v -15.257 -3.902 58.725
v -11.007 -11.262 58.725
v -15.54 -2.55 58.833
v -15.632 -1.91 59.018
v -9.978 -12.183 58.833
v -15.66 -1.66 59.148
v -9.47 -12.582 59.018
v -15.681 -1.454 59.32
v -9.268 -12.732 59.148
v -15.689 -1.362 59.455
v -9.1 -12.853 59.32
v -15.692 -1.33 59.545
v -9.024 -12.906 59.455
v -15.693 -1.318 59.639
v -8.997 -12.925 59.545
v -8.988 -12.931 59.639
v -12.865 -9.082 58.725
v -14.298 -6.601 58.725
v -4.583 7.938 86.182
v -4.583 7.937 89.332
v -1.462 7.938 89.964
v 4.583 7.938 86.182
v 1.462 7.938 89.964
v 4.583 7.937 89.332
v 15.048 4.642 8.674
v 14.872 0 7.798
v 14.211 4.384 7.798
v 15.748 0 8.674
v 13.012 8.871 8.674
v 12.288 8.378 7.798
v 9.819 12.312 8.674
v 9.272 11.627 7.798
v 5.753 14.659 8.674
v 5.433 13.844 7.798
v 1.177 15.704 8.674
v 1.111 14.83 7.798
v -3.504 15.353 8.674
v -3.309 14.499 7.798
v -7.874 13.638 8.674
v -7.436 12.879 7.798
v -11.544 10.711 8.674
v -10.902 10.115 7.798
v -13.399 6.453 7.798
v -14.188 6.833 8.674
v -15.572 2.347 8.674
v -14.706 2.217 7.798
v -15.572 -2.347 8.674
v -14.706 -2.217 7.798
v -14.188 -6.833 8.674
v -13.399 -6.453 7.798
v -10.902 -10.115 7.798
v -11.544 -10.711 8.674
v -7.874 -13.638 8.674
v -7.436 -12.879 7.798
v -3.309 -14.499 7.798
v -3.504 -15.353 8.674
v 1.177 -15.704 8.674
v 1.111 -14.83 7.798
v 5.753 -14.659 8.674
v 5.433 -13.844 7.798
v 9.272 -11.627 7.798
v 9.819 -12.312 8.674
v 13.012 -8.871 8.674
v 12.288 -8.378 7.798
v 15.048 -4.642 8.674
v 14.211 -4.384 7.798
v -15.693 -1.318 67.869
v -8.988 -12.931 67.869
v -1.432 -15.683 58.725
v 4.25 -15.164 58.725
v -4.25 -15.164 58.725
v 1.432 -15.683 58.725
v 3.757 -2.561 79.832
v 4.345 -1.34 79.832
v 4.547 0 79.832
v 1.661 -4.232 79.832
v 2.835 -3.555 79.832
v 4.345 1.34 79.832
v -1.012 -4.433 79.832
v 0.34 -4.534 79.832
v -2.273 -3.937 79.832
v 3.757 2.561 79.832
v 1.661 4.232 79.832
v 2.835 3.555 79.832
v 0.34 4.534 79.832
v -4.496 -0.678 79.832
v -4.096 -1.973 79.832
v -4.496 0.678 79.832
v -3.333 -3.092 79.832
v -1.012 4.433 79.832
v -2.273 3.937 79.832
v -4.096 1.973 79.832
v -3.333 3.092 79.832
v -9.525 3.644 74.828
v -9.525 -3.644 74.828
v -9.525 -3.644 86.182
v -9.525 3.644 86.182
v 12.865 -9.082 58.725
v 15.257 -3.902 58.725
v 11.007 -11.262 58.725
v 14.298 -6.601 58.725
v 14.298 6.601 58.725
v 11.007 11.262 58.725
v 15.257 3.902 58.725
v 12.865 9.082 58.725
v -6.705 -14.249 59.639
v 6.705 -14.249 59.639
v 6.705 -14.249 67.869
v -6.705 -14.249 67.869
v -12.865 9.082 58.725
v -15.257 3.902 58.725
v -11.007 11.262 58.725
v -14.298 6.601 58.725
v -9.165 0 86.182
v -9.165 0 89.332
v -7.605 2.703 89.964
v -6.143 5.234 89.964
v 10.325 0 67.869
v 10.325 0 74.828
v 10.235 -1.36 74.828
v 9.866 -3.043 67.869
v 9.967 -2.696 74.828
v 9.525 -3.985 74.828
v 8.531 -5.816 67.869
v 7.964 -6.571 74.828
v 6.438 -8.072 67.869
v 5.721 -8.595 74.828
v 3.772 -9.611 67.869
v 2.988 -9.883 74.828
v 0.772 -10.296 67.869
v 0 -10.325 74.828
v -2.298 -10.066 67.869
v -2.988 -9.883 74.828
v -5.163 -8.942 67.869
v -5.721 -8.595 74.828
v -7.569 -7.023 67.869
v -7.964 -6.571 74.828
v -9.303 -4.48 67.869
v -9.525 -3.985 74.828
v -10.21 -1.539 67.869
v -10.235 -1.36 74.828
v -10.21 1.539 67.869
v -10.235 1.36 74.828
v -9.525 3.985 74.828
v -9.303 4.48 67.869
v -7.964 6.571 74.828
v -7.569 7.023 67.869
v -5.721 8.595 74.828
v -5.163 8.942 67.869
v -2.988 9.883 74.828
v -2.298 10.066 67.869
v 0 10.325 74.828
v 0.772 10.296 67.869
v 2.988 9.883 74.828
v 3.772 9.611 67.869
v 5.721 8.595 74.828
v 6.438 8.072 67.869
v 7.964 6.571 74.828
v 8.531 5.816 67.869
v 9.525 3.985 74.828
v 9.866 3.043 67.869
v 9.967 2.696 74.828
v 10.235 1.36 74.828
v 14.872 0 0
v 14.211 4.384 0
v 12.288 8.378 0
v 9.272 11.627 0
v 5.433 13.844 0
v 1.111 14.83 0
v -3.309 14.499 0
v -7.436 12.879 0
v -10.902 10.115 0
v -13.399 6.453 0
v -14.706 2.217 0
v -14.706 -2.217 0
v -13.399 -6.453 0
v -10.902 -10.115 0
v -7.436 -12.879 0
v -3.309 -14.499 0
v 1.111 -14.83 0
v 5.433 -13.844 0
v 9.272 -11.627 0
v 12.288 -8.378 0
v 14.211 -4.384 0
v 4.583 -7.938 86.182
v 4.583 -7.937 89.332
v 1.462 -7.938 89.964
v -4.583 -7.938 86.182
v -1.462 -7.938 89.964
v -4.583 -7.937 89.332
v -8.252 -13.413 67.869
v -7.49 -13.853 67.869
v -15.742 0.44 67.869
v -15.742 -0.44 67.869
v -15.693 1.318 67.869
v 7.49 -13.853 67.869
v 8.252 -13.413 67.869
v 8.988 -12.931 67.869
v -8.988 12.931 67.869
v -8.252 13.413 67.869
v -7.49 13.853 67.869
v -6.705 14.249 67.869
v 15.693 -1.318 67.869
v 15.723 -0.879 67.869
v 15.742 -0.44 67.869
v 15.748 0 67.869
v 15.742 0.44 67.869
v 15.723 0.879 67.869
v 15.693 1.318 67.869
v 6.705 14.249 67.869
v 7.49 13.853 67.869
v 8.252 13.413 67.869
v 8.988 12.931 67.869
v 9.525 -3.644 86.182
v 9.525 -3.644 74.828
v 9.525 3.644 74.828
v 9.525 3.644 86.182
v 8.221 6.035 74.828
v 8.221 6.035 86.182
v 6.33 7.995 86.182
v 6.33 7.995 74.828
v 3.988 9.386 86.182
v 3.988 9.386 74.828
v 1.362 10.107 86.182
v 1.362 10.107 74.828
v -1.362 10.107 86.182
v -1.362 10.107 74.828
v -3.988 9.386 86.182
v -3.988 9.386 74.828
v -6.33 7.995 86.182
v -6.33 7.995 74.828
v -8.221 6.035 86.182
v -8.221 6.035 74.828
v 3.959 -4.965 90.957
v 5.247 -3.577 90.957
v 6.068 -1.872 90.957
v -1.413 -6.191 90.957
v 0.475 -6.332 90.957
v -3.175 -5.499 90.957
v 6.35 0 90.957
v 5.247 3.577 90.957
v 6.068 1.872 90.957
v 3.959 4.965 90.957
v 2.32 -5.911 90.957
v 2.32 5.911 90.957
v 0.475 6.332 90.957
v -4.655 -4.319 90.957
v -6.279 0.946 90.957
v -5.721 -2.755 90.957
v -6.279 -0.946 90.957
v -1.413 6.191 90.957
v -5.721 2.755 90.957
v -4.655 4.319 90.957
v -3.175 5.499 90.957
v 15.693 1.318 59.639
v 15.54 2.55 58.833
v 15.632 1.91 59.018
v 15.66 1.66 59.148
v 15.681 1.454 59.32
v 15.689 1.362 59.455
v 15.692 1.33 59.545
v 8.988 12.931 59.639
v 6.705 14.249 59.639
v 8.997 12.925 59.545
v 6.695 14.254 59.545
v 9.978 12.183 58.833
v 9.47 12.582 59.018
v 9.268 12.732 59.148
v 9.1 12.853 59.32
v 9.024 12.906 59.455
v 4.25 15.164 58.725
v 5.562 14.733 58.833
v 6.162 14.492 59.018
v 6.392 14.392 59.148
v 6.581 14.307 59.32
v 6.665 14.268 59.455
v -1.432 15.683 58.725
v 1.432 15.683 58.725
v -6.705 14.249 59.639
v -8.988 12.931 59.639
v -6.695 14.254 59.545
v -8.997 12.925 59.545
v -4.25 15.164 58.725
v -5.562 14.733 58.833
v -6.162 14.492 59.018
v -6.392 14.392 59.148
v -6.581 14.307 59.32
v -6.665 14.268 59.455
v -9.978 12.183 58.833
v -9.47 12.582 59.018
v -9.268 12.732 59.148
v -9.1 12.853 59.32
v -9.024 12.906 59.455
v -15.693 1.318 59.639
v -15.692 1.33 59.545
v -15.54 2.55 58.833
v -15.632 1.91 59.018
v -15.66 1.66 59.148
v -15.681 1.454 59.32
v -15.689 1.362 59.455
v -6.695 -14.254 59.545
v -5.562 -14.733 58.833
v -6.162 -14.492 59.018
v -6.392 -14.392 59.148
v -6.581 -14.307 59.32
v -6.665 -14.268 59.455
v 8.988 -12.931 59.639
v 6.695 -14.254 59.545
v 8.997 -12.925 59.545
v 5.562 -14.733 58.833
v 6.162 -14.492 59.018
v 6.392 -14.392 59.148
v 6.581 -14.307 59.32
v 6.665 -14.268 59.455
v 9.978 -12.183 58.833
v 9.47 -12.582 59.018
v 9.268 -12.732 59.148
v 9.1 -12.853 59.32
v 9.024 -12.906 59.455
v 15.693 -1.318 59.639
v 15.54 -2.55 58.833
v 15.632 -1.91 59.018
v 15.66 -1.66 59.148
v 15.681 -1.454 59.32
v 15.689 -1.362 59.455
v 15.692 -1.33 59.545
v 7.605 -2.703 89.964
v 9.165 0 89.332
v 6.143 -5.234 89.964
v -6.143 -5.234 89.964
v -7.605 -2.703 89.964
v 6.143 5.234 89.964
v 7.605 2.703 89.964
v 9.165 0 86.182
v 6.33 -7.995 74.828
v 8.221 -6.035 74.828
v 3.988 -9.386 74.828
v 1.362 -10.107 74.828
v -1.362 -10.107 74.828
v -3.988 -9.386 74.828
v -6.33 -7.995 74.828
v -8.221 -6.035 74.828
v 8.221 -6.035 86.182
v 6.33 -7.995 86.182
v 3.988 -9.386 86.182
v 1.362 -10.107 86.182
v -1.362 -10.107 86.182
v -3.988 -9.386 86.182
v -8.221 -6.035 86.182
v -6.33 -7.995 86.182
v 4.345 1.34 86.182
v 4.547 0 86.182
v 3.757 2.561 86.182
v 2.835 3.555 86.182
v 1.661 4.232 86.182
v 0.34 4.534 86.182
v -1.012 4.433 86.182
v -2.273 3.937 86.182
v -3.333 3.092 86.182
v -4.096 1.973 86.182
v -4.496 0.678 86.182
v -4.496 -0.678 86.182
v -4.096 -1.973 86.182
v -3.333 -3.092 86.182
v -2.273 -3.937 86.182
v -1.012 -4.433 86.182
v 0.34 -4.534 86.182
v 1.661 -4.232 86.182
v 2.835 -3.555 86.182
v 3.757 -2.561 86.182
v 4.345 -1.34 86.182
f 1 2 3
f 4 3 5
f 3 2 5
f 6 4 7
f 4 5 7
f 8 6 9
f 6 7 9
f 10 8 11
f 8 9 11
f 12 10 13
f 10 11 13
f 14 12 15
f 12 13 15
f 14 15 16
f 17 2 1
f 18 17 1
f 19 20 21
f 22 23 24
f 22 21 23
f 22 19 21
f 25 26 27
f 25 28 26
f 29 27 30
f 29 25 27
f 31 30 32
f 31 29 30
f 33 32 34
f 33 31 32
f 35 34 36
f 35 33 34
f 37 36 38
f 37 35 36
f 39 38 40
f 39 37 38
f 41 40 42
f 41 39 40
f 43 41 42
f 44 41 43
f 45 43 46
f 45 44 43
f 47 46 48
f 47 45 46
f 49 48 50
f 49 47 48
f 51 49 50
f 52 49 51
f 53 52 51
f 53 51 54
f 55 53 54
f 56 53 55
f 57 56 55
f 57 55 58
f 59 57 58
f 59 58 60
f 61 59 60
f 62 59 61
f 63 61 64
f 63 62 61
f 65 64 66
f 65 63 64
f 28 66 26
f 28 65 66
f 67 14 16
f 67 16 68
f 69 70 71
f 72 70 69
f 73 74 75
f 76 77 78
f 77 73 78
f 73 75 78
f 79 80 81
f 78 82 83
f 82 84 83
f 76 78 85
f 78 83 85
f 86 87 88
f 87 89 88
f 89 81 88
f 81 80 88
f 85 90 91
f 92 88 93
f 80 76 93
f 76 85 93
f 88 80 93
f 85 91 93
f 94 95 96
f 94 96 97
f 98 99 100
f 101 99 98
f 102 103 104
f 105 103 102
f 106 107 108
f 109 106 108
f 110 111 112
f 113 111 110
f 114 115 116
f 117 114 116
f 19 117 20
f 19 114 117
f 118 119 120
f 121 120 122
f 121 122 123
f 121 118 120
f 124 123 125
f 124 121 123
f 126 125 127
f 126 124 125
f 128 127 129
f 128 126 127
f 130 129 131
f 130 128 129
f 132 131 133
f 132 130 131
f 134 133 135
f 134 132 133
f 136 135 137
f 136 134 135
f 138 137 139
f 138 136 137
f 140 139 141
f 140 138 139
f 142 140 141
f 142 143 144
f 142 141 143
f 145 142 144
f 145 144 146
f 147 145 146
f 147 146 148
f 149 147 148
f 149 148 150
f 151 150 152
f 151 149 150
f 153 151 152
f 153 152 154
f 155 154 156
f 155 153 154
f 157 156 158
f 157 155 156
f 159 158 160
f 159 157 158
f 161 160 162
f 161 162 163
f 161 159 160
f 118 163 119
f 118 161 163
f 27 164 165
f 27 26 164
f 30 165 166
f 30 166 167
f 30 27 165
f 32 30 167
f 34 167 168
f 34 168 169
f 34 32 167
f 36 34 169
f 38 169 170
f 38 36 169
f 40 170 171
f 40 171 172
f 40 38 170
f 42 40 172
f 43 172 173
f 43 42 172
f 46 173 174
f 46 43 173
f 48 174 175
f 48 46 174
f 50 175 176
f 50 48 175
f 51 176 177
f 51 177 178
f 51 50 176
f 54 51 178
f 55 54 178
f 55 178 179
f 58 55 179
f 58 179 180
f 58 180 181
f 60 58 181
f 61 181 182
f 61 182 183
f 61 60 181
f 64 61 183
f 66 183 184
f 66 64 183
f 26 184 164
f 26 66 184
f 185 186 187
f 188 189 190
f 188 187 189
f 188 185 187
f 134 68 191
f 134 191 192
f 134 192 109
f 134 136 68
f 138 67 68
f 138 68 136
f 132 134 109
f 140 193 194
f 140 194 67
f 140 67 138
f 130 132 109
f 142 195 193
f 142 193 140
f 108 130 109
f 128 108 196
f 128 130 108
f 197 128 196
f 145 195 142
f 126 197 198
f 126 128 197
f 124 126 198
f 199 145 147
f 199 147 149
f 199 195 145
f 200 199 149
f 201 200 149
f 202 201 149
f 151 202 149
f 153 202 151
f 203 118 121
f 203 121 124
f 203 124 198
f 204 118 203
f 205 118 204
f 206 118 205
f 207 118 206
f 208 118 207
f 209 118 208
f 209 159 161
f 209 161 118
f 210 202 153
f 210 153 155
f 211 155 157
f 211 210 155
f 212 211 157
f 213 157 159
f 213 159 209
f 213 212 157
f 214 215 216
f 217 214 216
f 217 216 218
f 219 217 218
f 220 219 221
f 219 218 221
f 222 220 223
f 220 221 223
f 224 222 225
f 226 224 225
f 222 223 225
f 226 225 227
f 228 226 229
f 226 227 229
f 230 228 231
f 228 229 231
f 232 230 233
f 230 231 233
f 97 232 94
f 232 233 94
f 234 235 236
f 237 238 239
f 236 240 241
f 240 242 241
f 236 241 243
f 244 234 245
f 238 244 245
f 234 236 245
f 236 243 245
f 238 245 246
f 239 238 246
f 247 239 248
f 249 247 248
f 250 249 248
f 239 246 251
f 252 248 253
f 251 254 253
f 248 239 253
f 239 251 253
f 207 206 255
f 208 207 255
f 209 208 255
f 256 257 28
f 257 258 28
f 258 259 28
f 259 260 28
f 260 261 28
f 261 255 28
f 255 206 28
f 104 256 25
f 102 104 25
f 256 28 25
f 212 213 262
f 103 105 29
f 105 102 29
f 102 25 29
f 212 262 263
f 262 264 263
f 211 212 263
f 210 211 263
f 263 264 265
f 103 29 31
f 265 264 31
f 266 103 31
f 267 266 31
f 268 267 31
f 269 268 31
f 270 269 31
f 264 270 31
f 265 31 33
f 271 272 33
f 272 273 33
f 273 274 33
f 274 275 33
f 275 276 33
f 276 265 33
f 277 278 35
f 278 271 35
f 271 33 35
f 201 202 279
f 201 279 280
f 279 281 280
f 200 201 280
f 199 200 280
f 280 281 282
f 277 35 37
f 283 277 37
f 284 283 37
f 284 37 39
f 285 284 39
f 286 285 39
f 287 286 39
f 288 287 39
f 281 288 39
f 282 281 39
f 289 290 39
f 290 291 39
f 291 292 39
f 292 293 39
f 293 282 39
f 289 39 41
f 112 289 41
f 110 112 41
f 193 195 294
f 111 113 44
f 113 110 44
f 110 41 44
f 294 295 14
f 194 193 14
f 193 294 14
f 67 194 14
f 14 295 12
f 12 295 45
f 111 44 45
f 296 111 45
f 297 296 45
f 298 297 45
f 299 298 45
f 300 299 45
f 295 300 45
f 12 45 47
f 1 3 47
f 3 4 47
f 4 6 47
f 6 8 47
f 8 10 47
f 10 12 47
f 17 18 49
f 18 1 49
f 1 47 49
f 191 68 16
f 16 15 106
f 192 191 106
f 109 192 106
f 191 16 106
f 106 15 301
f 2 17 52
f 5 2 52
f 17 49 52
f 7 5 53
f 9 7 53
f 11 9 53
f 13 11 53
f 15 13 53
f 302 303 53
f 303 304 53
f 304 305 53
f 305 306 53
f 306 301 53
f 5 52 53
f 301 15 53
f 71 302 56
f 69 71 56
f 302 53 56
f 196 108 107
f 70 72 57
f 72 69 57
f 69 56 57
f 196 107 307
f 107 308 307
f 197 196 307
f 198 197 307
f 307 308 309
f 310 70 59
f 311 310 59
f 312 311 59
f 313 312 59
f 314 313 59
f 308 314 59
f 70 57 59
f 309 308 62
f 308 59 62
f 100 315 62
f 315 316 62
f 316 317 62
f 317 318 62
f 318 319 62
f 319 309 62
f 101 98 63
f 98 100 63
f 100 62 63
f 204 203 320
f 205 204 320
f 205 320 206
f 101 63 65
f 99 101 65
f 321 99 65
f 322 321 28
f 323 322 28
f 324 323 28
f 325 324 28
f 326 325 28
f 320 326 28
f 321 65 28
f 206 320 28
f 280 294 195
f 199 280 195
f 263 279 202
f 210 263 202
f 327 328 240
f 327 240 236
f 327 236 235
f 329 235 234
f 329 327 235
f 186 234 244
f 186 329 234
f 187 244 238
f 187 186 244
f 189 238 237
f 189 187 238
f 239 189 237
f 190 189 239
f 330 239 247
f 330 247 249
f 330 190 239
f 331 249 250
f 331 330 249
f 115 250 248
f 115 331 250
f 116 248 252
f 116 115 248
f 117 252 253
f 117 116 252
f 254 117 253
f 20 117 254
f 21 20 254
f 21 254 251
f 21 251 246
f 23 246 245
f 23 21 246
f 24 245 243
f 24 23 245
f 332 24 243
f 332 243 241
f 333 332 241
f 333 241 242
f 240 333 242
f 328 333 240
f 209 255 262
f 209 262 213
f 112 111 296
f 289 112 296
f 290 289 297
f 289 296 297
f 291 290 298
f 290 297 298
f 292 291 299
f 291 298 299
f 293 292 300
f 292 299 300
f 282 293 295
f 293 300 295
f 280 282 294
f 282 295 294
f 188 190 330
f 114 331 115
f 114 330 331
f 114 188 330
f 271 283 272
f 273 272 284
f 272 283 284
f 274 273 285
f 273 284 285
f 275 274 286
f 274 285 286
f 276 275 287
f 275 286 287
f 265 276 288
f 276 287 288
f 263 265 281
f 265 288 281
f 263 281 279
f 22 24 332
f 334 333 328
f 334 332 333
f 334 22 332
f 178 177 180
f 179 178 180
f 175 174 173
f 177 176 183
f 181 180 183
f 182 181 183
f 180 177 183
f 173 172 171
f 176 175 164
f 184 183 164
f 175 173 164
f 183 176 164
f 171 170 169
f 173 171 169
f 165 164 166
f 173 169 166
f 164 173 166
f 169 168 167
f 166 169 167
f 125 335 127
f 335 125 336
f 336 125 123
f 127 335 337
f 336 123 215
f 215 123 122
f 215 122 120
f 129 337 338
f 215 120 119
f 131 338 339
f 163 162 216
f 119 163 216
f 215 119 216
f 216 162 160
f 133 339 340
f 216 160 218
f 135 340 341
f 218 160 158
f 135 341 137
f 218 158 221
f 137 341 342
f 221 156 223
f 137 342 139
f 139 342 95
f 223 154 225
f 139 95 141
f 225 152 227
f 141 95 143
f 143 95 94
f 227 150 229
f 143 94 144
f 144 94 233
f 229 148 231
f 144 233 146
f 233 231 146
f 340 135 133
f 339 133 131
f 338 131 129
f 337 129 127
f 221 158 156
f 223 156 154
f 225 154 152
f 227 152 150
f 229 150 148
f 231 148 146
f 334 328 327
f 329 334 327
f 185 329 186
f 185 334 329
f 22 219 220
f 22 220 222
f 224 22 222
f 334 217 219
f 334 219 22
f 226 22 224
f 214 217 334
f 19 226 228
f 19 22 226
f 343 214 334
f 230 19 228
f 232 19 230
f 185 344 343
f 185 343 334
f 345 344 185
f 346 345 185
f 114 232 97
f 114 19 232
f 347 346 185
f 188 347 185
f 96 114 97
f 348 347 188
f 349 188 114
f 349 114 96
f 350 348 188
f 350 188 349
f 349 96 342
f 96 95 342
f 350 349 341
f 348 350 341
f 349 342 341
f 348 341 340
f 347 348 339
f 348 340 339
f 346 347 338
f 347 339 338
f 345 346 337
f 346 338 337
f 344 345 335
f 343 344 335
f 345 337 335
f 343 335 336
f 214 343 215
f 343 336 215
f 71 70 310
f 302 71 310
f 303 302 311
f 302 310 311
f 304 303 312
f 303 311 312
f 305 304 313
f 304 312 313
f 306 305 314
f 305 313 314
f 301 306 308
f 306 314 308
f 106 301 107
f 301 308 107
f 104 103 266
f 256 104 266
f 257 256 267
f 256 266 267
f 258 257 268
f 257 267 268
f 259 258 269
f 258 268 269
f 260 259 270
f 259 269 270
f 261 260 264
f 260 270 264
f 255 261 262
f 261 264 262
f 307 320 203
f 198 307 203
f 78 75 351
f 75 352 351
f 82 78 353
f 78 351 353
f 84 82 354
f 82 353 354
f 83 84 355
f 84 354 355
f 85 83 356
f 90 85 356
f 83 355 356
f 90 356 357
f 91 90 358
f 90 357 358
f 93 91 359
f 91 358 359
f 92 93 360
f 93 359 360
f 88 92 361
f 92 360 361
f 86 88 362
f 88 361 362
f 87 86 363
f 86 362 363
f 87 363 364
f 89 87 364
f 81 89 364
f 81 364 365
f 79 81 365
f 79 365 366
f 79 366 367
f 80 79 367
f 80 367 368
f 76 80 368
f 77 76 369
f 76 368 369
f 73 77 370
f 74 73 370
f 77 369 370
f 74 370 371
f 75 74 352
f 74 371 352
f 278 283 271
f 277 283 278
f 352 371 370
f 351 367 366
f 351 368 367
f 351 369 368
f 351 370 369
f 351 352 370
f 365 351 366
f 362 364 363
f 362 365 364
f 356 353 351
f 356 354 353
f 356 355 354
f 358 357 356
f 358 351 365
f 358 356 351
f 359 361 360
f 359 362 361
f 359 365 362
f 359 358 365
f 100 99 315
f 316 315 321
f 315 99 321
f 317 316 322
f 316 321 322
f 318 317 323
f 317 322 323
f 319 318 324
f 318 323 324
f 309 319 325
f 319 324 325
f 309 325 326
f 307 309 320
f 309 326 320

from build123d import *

# Parameters (mm, degrees)
SKETCH1_R           = 15.748
EXTRUDE1_DEPTH      = 67.8688
CUT_EXTRUDE1_DEPTH  = 18.8976
SKETCH11_W          = 18.3134
SKETCH11_H          = 10.3251
S2D0011_W           = 4.5466
S2D0011_H           = 6.35
CUT_EXTRUDE10_DEPTH = 11.3538
EXTRUDE2_DEPTH      = 4.7752
CIRPATTERN2_COUNT   = 6
SKETCH18_W          = 11.3538
SKETCH18_H          = 0.127


with BuildPart() as part:
    # Sketch1 → Extrude1 (new body)
    with BuildSketch(Plane.XY):
        Circle(SKETCH1_R)
    extrude(amount=EXTRUDE1_DEPTH)

    # Sketch2 → Cut-Extrude1 (cut, symmetric)
    with BuildSketch(Plane(origin=(0, 0, 0), x_dir=(0, 0, 1), z_dir=(1, 0, 0))):
        with BuildLine():
            Line((58.7248, 15.748), (58.7248, 15.1638))
            ThreePointArc((58.7248, 15.1638), (58.992621559, 14.517221559), (59.6392, 14.2494))
            Line((59.6392, 14.2494), (67.8688, 14.2494))
            Line((67.8688, 14.2494), (67.8688, 15.748))
            Line((67.8688, 15.748), (58.7248, 15.748))
        make_face()
    cut_extrude1 = extrude(amount=CUT_EXTRUDE1_DEPTH, both=True, mode=Mode.SUBTRACT)

    # Sketch10 → Cut-Revolve1 (revolve, cut)
    with BuildSketch(Plane(origin=(0, 0, 0), x_dir=(0, 0, 1), z_dir=(1, 0, 0)), mode=Mode.PRIVATE) as cut_revolve1_sk:
        Polygon((0, 14.8717), (7.7978, 14.8717), (8.6741, 15.748), (0, 15.748), align=None)
    revolve(cut_revolve1_sk.sketch.rotate(Axis((0, 0, -0.433705), (0, 0, 1)), 90), axis=Axis((0, 0, -0.433705), (0, 0, 1)), mode=Mode.SUBTRACT)  # turned: the seam where the file's is

    # Sketch11 → Revolve1 (revolve)
    with BuildSketch(Plane(origin=(0, 0, 0), x_dir=(0, 0, -1), z_dir=(1, 0, 0)), mode=Mode.PRIVATE) as revolve1_sk:
        with Locations((-77.0255, 5.16255)):
            Rectangle(SKETCH11_W, SKETCH11_H)
    revolve(revolve1_sk.sketch.rotate(Axis((0, 0, 71.06412), (0, 0, -1)), 90), axis=Axis((0, 0, 71.06412), (0, 0, -1)))  # turned: the seam where the file's is

    # S2D0011 → Cut-Revolve2 (revolve, cut)
    with BuildSketch(Plane(origin=(-4.5466, 0, 70.3072), x_dir=(-1, 0, 0), z_dir=(0, 1, 0)), mode=Mode.PRIVATE) as cut_revolve2_sk:
        with Locations((-2.2733, 12.7)):
            Rectangle(S2D0011_W, S2D0011_H)
    revolve(cut_revolve2_sk.sketch.rotate(Axis((0, 0, 48.067068782), (0, 0, 1)), 180), axis=Axis((0, 0, 48.067068782), (0, 0, 1)), mode=Mode.SUBTRACT)  # turned: the seam where the file's is

    # Sketch14 → Cut-Extrude10 (cut)
    with BuildSketch(Plane.YX.offset(-86.1822)):
        with BuildLine():
            Line((-3.98523086, 9.525), (3.98523086, 9.525))
            ThreePointArc((3.98523086, 9.525), (0, 10.3251), (-3.98523086, 9.525))
        make_face()
        with BuildLine():
            Line((-3.98523086, -9.525), (3.98523086, -9.525))
            ThreePointArc((3.98523086, -9.525), (0, -10.3251), (-3.98523086, -9.525))
        make_face()
    extrude(amount=CUT_EXTRUDE10_DEPTH, mode=Mode.SUBTRACT)

    # Sketch15 → Extrude2 (add)
    with BuildSketch(Plane.XY.offset(86.1822)):
        Polygon((-4.582717762, 7.9375), (4.582717762, 7.9375), (9.165435523, 0), (4.582717762, -7.9375), (-4.582717762, -7.9375), (-9.165435523, 0), align=None)
    extrude(amount=EXTRUDE2_DEPTH)

    # Sketch16 → Cut-Revolve3 (revolve, cut)
    with BuildSketch(Plane(origin=(0, 0, 0), x_dir=(1, 0, 0), z_dir=(0, 1, 0))):
        Polygon((6.35, -90.9574), (9.165435523, -89.331907543), (9.165435523, -90.9574), align=None)
    revolve(axis=Axis((0, 0, 75.163674623), (0, 0, -1)), mode=Mode.SUBTRACT)

    # CirPattern2: Cut-Extrude1 ×6 about axis
    cirpattern2_axis = Axis((0, 0, 0), (0, 0, 1))
    for i in range(1, CIRPATTERN2_COUNT):
        add(cut_extrude1.rotate(cirpattern2_axis, i * 360 / CIRPATTERN2_COUNT), mode=Mode.SUBTRACT)

    # Sketch18 → Cut-Revolve4 (revolve, cut)
    with BuildSketch(Plane(origin=(0, 0, 0), x_dir=(0, 0, -1), z_dir=(1, 0, 0)), mode=Mode.PRIVATE) as cut_revolve4_sk:
        with Locations((-80.5053, 10.2616)):
            Rectangle(SKETCH18_W, SKETCH18_H)
    revolve(cut_revolve4_sk.sketch.rotate(Axis((0, 0, 0), (0, 0, 1)), 270), axis=Axis((0, 0, 0), (0, 0, 1)), mode=Mode.SUBTRACT)  # turned: the seam where the file's is


solid = part.part
